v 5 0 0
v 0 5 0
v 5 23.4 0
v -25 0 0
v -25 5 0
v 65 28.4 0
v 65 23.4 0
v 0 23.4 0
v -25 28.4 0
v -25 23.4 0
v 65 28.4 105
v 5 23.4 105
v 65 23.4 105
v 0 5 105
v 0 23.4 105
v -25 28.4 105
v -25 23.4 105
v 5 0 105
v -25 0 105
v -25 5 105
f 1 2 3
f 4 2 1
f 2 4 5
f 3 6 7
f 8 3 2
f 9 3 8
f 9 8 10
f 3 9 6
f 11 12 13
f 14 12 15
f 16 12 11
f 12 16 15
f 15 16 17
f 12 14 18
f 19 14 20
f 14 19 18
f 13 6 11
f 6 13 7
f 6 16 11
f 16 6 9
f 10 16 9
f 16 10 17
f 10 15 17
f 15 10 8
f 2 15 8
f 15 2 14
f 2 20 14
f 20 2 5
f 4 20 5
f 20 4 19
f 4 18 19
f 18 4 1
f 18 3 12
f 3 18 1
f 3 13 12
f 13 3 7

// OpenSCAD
// Pipette Holder Clamp - Corrected v3
// Designed for an 18mm thick shelf.
// Printed lying on its side (XY plane is the profile, Z is the extrusion/length).

// --- Dimensions ---
shelf_thickness = 18.0;
spine_x_start   = 0.0;
spine_x_end     = 5.0;
spine_y_start   = 0.0;
spine_y_end     = 28.4;

bottom_jaw_x_start = -25.0;
bottom_jaw_x_end   = 5.0;
bottom_jaw_y_start = 0.0;
bottom_jaw_y_end   = 5.0;

top_jaw_x_start    = -25.0;
top_jaw_x_end      = 65.0;
top_jaw_y_start    = 23.4;
top_jaw_y_end      = 28.4;

extrusion_z         = 105.0;

hole_diameter       = 20.0;
hole_x_center       = 42.0;
hole_y_center       = 25.9; // Midpoint of top jaw (23.4 + 28.4)/2
hole_z_centers       = [17.5, 52.5, 87.5]; 

$fn = 64;

module profile() {
    union() {
        // Spine
        polygon(points=[[spine_x_start, spine_y_start], [spine_x_end, spine_y_start], [spine_x_end, spine_y_end], [spine_x_start, spine_y_end]]);
        // Bottom Jaw
        polygon(points=[[bottom_jaw_x_start, bottom_jaw_y_start], [bottom_jaw_x_end, bottom_jaw_y_start], [bottom_jaw_x_end, bottom_jaw_y_end], [bottom_jaw_x_start, bottom_jaw_y_end]]);
        // Top Jaw/Arm
        polygon(points=[[top_jaw_x_start, top_jaw_y_start], [top_jaw_x_end, top_jaw_y_start], [top_jaw_x_end, top_jaw_y_end], [top_jaw_x_start, top_jaw_y_end]]);
    }
}

difference() {
    // Main Body
    linear_extrude(height = extrusion_z)
        profile();

    // Holes through the arm along Y
    // To ensure they cut through, we translate the cylinder so its center is at hole_y_center
    // and its height spans the entire Y range of the part.
    for (z_pos = hole_z_centers) {
        translate([hole_x_center, 0, z_pos]) // Start at y=0
            rotate([0, 90, 0])               // Rotate to point along Y
                cylinder(h = 30, d = hole_diameter); // h=30 is > max Y (28.4)
    }
}
